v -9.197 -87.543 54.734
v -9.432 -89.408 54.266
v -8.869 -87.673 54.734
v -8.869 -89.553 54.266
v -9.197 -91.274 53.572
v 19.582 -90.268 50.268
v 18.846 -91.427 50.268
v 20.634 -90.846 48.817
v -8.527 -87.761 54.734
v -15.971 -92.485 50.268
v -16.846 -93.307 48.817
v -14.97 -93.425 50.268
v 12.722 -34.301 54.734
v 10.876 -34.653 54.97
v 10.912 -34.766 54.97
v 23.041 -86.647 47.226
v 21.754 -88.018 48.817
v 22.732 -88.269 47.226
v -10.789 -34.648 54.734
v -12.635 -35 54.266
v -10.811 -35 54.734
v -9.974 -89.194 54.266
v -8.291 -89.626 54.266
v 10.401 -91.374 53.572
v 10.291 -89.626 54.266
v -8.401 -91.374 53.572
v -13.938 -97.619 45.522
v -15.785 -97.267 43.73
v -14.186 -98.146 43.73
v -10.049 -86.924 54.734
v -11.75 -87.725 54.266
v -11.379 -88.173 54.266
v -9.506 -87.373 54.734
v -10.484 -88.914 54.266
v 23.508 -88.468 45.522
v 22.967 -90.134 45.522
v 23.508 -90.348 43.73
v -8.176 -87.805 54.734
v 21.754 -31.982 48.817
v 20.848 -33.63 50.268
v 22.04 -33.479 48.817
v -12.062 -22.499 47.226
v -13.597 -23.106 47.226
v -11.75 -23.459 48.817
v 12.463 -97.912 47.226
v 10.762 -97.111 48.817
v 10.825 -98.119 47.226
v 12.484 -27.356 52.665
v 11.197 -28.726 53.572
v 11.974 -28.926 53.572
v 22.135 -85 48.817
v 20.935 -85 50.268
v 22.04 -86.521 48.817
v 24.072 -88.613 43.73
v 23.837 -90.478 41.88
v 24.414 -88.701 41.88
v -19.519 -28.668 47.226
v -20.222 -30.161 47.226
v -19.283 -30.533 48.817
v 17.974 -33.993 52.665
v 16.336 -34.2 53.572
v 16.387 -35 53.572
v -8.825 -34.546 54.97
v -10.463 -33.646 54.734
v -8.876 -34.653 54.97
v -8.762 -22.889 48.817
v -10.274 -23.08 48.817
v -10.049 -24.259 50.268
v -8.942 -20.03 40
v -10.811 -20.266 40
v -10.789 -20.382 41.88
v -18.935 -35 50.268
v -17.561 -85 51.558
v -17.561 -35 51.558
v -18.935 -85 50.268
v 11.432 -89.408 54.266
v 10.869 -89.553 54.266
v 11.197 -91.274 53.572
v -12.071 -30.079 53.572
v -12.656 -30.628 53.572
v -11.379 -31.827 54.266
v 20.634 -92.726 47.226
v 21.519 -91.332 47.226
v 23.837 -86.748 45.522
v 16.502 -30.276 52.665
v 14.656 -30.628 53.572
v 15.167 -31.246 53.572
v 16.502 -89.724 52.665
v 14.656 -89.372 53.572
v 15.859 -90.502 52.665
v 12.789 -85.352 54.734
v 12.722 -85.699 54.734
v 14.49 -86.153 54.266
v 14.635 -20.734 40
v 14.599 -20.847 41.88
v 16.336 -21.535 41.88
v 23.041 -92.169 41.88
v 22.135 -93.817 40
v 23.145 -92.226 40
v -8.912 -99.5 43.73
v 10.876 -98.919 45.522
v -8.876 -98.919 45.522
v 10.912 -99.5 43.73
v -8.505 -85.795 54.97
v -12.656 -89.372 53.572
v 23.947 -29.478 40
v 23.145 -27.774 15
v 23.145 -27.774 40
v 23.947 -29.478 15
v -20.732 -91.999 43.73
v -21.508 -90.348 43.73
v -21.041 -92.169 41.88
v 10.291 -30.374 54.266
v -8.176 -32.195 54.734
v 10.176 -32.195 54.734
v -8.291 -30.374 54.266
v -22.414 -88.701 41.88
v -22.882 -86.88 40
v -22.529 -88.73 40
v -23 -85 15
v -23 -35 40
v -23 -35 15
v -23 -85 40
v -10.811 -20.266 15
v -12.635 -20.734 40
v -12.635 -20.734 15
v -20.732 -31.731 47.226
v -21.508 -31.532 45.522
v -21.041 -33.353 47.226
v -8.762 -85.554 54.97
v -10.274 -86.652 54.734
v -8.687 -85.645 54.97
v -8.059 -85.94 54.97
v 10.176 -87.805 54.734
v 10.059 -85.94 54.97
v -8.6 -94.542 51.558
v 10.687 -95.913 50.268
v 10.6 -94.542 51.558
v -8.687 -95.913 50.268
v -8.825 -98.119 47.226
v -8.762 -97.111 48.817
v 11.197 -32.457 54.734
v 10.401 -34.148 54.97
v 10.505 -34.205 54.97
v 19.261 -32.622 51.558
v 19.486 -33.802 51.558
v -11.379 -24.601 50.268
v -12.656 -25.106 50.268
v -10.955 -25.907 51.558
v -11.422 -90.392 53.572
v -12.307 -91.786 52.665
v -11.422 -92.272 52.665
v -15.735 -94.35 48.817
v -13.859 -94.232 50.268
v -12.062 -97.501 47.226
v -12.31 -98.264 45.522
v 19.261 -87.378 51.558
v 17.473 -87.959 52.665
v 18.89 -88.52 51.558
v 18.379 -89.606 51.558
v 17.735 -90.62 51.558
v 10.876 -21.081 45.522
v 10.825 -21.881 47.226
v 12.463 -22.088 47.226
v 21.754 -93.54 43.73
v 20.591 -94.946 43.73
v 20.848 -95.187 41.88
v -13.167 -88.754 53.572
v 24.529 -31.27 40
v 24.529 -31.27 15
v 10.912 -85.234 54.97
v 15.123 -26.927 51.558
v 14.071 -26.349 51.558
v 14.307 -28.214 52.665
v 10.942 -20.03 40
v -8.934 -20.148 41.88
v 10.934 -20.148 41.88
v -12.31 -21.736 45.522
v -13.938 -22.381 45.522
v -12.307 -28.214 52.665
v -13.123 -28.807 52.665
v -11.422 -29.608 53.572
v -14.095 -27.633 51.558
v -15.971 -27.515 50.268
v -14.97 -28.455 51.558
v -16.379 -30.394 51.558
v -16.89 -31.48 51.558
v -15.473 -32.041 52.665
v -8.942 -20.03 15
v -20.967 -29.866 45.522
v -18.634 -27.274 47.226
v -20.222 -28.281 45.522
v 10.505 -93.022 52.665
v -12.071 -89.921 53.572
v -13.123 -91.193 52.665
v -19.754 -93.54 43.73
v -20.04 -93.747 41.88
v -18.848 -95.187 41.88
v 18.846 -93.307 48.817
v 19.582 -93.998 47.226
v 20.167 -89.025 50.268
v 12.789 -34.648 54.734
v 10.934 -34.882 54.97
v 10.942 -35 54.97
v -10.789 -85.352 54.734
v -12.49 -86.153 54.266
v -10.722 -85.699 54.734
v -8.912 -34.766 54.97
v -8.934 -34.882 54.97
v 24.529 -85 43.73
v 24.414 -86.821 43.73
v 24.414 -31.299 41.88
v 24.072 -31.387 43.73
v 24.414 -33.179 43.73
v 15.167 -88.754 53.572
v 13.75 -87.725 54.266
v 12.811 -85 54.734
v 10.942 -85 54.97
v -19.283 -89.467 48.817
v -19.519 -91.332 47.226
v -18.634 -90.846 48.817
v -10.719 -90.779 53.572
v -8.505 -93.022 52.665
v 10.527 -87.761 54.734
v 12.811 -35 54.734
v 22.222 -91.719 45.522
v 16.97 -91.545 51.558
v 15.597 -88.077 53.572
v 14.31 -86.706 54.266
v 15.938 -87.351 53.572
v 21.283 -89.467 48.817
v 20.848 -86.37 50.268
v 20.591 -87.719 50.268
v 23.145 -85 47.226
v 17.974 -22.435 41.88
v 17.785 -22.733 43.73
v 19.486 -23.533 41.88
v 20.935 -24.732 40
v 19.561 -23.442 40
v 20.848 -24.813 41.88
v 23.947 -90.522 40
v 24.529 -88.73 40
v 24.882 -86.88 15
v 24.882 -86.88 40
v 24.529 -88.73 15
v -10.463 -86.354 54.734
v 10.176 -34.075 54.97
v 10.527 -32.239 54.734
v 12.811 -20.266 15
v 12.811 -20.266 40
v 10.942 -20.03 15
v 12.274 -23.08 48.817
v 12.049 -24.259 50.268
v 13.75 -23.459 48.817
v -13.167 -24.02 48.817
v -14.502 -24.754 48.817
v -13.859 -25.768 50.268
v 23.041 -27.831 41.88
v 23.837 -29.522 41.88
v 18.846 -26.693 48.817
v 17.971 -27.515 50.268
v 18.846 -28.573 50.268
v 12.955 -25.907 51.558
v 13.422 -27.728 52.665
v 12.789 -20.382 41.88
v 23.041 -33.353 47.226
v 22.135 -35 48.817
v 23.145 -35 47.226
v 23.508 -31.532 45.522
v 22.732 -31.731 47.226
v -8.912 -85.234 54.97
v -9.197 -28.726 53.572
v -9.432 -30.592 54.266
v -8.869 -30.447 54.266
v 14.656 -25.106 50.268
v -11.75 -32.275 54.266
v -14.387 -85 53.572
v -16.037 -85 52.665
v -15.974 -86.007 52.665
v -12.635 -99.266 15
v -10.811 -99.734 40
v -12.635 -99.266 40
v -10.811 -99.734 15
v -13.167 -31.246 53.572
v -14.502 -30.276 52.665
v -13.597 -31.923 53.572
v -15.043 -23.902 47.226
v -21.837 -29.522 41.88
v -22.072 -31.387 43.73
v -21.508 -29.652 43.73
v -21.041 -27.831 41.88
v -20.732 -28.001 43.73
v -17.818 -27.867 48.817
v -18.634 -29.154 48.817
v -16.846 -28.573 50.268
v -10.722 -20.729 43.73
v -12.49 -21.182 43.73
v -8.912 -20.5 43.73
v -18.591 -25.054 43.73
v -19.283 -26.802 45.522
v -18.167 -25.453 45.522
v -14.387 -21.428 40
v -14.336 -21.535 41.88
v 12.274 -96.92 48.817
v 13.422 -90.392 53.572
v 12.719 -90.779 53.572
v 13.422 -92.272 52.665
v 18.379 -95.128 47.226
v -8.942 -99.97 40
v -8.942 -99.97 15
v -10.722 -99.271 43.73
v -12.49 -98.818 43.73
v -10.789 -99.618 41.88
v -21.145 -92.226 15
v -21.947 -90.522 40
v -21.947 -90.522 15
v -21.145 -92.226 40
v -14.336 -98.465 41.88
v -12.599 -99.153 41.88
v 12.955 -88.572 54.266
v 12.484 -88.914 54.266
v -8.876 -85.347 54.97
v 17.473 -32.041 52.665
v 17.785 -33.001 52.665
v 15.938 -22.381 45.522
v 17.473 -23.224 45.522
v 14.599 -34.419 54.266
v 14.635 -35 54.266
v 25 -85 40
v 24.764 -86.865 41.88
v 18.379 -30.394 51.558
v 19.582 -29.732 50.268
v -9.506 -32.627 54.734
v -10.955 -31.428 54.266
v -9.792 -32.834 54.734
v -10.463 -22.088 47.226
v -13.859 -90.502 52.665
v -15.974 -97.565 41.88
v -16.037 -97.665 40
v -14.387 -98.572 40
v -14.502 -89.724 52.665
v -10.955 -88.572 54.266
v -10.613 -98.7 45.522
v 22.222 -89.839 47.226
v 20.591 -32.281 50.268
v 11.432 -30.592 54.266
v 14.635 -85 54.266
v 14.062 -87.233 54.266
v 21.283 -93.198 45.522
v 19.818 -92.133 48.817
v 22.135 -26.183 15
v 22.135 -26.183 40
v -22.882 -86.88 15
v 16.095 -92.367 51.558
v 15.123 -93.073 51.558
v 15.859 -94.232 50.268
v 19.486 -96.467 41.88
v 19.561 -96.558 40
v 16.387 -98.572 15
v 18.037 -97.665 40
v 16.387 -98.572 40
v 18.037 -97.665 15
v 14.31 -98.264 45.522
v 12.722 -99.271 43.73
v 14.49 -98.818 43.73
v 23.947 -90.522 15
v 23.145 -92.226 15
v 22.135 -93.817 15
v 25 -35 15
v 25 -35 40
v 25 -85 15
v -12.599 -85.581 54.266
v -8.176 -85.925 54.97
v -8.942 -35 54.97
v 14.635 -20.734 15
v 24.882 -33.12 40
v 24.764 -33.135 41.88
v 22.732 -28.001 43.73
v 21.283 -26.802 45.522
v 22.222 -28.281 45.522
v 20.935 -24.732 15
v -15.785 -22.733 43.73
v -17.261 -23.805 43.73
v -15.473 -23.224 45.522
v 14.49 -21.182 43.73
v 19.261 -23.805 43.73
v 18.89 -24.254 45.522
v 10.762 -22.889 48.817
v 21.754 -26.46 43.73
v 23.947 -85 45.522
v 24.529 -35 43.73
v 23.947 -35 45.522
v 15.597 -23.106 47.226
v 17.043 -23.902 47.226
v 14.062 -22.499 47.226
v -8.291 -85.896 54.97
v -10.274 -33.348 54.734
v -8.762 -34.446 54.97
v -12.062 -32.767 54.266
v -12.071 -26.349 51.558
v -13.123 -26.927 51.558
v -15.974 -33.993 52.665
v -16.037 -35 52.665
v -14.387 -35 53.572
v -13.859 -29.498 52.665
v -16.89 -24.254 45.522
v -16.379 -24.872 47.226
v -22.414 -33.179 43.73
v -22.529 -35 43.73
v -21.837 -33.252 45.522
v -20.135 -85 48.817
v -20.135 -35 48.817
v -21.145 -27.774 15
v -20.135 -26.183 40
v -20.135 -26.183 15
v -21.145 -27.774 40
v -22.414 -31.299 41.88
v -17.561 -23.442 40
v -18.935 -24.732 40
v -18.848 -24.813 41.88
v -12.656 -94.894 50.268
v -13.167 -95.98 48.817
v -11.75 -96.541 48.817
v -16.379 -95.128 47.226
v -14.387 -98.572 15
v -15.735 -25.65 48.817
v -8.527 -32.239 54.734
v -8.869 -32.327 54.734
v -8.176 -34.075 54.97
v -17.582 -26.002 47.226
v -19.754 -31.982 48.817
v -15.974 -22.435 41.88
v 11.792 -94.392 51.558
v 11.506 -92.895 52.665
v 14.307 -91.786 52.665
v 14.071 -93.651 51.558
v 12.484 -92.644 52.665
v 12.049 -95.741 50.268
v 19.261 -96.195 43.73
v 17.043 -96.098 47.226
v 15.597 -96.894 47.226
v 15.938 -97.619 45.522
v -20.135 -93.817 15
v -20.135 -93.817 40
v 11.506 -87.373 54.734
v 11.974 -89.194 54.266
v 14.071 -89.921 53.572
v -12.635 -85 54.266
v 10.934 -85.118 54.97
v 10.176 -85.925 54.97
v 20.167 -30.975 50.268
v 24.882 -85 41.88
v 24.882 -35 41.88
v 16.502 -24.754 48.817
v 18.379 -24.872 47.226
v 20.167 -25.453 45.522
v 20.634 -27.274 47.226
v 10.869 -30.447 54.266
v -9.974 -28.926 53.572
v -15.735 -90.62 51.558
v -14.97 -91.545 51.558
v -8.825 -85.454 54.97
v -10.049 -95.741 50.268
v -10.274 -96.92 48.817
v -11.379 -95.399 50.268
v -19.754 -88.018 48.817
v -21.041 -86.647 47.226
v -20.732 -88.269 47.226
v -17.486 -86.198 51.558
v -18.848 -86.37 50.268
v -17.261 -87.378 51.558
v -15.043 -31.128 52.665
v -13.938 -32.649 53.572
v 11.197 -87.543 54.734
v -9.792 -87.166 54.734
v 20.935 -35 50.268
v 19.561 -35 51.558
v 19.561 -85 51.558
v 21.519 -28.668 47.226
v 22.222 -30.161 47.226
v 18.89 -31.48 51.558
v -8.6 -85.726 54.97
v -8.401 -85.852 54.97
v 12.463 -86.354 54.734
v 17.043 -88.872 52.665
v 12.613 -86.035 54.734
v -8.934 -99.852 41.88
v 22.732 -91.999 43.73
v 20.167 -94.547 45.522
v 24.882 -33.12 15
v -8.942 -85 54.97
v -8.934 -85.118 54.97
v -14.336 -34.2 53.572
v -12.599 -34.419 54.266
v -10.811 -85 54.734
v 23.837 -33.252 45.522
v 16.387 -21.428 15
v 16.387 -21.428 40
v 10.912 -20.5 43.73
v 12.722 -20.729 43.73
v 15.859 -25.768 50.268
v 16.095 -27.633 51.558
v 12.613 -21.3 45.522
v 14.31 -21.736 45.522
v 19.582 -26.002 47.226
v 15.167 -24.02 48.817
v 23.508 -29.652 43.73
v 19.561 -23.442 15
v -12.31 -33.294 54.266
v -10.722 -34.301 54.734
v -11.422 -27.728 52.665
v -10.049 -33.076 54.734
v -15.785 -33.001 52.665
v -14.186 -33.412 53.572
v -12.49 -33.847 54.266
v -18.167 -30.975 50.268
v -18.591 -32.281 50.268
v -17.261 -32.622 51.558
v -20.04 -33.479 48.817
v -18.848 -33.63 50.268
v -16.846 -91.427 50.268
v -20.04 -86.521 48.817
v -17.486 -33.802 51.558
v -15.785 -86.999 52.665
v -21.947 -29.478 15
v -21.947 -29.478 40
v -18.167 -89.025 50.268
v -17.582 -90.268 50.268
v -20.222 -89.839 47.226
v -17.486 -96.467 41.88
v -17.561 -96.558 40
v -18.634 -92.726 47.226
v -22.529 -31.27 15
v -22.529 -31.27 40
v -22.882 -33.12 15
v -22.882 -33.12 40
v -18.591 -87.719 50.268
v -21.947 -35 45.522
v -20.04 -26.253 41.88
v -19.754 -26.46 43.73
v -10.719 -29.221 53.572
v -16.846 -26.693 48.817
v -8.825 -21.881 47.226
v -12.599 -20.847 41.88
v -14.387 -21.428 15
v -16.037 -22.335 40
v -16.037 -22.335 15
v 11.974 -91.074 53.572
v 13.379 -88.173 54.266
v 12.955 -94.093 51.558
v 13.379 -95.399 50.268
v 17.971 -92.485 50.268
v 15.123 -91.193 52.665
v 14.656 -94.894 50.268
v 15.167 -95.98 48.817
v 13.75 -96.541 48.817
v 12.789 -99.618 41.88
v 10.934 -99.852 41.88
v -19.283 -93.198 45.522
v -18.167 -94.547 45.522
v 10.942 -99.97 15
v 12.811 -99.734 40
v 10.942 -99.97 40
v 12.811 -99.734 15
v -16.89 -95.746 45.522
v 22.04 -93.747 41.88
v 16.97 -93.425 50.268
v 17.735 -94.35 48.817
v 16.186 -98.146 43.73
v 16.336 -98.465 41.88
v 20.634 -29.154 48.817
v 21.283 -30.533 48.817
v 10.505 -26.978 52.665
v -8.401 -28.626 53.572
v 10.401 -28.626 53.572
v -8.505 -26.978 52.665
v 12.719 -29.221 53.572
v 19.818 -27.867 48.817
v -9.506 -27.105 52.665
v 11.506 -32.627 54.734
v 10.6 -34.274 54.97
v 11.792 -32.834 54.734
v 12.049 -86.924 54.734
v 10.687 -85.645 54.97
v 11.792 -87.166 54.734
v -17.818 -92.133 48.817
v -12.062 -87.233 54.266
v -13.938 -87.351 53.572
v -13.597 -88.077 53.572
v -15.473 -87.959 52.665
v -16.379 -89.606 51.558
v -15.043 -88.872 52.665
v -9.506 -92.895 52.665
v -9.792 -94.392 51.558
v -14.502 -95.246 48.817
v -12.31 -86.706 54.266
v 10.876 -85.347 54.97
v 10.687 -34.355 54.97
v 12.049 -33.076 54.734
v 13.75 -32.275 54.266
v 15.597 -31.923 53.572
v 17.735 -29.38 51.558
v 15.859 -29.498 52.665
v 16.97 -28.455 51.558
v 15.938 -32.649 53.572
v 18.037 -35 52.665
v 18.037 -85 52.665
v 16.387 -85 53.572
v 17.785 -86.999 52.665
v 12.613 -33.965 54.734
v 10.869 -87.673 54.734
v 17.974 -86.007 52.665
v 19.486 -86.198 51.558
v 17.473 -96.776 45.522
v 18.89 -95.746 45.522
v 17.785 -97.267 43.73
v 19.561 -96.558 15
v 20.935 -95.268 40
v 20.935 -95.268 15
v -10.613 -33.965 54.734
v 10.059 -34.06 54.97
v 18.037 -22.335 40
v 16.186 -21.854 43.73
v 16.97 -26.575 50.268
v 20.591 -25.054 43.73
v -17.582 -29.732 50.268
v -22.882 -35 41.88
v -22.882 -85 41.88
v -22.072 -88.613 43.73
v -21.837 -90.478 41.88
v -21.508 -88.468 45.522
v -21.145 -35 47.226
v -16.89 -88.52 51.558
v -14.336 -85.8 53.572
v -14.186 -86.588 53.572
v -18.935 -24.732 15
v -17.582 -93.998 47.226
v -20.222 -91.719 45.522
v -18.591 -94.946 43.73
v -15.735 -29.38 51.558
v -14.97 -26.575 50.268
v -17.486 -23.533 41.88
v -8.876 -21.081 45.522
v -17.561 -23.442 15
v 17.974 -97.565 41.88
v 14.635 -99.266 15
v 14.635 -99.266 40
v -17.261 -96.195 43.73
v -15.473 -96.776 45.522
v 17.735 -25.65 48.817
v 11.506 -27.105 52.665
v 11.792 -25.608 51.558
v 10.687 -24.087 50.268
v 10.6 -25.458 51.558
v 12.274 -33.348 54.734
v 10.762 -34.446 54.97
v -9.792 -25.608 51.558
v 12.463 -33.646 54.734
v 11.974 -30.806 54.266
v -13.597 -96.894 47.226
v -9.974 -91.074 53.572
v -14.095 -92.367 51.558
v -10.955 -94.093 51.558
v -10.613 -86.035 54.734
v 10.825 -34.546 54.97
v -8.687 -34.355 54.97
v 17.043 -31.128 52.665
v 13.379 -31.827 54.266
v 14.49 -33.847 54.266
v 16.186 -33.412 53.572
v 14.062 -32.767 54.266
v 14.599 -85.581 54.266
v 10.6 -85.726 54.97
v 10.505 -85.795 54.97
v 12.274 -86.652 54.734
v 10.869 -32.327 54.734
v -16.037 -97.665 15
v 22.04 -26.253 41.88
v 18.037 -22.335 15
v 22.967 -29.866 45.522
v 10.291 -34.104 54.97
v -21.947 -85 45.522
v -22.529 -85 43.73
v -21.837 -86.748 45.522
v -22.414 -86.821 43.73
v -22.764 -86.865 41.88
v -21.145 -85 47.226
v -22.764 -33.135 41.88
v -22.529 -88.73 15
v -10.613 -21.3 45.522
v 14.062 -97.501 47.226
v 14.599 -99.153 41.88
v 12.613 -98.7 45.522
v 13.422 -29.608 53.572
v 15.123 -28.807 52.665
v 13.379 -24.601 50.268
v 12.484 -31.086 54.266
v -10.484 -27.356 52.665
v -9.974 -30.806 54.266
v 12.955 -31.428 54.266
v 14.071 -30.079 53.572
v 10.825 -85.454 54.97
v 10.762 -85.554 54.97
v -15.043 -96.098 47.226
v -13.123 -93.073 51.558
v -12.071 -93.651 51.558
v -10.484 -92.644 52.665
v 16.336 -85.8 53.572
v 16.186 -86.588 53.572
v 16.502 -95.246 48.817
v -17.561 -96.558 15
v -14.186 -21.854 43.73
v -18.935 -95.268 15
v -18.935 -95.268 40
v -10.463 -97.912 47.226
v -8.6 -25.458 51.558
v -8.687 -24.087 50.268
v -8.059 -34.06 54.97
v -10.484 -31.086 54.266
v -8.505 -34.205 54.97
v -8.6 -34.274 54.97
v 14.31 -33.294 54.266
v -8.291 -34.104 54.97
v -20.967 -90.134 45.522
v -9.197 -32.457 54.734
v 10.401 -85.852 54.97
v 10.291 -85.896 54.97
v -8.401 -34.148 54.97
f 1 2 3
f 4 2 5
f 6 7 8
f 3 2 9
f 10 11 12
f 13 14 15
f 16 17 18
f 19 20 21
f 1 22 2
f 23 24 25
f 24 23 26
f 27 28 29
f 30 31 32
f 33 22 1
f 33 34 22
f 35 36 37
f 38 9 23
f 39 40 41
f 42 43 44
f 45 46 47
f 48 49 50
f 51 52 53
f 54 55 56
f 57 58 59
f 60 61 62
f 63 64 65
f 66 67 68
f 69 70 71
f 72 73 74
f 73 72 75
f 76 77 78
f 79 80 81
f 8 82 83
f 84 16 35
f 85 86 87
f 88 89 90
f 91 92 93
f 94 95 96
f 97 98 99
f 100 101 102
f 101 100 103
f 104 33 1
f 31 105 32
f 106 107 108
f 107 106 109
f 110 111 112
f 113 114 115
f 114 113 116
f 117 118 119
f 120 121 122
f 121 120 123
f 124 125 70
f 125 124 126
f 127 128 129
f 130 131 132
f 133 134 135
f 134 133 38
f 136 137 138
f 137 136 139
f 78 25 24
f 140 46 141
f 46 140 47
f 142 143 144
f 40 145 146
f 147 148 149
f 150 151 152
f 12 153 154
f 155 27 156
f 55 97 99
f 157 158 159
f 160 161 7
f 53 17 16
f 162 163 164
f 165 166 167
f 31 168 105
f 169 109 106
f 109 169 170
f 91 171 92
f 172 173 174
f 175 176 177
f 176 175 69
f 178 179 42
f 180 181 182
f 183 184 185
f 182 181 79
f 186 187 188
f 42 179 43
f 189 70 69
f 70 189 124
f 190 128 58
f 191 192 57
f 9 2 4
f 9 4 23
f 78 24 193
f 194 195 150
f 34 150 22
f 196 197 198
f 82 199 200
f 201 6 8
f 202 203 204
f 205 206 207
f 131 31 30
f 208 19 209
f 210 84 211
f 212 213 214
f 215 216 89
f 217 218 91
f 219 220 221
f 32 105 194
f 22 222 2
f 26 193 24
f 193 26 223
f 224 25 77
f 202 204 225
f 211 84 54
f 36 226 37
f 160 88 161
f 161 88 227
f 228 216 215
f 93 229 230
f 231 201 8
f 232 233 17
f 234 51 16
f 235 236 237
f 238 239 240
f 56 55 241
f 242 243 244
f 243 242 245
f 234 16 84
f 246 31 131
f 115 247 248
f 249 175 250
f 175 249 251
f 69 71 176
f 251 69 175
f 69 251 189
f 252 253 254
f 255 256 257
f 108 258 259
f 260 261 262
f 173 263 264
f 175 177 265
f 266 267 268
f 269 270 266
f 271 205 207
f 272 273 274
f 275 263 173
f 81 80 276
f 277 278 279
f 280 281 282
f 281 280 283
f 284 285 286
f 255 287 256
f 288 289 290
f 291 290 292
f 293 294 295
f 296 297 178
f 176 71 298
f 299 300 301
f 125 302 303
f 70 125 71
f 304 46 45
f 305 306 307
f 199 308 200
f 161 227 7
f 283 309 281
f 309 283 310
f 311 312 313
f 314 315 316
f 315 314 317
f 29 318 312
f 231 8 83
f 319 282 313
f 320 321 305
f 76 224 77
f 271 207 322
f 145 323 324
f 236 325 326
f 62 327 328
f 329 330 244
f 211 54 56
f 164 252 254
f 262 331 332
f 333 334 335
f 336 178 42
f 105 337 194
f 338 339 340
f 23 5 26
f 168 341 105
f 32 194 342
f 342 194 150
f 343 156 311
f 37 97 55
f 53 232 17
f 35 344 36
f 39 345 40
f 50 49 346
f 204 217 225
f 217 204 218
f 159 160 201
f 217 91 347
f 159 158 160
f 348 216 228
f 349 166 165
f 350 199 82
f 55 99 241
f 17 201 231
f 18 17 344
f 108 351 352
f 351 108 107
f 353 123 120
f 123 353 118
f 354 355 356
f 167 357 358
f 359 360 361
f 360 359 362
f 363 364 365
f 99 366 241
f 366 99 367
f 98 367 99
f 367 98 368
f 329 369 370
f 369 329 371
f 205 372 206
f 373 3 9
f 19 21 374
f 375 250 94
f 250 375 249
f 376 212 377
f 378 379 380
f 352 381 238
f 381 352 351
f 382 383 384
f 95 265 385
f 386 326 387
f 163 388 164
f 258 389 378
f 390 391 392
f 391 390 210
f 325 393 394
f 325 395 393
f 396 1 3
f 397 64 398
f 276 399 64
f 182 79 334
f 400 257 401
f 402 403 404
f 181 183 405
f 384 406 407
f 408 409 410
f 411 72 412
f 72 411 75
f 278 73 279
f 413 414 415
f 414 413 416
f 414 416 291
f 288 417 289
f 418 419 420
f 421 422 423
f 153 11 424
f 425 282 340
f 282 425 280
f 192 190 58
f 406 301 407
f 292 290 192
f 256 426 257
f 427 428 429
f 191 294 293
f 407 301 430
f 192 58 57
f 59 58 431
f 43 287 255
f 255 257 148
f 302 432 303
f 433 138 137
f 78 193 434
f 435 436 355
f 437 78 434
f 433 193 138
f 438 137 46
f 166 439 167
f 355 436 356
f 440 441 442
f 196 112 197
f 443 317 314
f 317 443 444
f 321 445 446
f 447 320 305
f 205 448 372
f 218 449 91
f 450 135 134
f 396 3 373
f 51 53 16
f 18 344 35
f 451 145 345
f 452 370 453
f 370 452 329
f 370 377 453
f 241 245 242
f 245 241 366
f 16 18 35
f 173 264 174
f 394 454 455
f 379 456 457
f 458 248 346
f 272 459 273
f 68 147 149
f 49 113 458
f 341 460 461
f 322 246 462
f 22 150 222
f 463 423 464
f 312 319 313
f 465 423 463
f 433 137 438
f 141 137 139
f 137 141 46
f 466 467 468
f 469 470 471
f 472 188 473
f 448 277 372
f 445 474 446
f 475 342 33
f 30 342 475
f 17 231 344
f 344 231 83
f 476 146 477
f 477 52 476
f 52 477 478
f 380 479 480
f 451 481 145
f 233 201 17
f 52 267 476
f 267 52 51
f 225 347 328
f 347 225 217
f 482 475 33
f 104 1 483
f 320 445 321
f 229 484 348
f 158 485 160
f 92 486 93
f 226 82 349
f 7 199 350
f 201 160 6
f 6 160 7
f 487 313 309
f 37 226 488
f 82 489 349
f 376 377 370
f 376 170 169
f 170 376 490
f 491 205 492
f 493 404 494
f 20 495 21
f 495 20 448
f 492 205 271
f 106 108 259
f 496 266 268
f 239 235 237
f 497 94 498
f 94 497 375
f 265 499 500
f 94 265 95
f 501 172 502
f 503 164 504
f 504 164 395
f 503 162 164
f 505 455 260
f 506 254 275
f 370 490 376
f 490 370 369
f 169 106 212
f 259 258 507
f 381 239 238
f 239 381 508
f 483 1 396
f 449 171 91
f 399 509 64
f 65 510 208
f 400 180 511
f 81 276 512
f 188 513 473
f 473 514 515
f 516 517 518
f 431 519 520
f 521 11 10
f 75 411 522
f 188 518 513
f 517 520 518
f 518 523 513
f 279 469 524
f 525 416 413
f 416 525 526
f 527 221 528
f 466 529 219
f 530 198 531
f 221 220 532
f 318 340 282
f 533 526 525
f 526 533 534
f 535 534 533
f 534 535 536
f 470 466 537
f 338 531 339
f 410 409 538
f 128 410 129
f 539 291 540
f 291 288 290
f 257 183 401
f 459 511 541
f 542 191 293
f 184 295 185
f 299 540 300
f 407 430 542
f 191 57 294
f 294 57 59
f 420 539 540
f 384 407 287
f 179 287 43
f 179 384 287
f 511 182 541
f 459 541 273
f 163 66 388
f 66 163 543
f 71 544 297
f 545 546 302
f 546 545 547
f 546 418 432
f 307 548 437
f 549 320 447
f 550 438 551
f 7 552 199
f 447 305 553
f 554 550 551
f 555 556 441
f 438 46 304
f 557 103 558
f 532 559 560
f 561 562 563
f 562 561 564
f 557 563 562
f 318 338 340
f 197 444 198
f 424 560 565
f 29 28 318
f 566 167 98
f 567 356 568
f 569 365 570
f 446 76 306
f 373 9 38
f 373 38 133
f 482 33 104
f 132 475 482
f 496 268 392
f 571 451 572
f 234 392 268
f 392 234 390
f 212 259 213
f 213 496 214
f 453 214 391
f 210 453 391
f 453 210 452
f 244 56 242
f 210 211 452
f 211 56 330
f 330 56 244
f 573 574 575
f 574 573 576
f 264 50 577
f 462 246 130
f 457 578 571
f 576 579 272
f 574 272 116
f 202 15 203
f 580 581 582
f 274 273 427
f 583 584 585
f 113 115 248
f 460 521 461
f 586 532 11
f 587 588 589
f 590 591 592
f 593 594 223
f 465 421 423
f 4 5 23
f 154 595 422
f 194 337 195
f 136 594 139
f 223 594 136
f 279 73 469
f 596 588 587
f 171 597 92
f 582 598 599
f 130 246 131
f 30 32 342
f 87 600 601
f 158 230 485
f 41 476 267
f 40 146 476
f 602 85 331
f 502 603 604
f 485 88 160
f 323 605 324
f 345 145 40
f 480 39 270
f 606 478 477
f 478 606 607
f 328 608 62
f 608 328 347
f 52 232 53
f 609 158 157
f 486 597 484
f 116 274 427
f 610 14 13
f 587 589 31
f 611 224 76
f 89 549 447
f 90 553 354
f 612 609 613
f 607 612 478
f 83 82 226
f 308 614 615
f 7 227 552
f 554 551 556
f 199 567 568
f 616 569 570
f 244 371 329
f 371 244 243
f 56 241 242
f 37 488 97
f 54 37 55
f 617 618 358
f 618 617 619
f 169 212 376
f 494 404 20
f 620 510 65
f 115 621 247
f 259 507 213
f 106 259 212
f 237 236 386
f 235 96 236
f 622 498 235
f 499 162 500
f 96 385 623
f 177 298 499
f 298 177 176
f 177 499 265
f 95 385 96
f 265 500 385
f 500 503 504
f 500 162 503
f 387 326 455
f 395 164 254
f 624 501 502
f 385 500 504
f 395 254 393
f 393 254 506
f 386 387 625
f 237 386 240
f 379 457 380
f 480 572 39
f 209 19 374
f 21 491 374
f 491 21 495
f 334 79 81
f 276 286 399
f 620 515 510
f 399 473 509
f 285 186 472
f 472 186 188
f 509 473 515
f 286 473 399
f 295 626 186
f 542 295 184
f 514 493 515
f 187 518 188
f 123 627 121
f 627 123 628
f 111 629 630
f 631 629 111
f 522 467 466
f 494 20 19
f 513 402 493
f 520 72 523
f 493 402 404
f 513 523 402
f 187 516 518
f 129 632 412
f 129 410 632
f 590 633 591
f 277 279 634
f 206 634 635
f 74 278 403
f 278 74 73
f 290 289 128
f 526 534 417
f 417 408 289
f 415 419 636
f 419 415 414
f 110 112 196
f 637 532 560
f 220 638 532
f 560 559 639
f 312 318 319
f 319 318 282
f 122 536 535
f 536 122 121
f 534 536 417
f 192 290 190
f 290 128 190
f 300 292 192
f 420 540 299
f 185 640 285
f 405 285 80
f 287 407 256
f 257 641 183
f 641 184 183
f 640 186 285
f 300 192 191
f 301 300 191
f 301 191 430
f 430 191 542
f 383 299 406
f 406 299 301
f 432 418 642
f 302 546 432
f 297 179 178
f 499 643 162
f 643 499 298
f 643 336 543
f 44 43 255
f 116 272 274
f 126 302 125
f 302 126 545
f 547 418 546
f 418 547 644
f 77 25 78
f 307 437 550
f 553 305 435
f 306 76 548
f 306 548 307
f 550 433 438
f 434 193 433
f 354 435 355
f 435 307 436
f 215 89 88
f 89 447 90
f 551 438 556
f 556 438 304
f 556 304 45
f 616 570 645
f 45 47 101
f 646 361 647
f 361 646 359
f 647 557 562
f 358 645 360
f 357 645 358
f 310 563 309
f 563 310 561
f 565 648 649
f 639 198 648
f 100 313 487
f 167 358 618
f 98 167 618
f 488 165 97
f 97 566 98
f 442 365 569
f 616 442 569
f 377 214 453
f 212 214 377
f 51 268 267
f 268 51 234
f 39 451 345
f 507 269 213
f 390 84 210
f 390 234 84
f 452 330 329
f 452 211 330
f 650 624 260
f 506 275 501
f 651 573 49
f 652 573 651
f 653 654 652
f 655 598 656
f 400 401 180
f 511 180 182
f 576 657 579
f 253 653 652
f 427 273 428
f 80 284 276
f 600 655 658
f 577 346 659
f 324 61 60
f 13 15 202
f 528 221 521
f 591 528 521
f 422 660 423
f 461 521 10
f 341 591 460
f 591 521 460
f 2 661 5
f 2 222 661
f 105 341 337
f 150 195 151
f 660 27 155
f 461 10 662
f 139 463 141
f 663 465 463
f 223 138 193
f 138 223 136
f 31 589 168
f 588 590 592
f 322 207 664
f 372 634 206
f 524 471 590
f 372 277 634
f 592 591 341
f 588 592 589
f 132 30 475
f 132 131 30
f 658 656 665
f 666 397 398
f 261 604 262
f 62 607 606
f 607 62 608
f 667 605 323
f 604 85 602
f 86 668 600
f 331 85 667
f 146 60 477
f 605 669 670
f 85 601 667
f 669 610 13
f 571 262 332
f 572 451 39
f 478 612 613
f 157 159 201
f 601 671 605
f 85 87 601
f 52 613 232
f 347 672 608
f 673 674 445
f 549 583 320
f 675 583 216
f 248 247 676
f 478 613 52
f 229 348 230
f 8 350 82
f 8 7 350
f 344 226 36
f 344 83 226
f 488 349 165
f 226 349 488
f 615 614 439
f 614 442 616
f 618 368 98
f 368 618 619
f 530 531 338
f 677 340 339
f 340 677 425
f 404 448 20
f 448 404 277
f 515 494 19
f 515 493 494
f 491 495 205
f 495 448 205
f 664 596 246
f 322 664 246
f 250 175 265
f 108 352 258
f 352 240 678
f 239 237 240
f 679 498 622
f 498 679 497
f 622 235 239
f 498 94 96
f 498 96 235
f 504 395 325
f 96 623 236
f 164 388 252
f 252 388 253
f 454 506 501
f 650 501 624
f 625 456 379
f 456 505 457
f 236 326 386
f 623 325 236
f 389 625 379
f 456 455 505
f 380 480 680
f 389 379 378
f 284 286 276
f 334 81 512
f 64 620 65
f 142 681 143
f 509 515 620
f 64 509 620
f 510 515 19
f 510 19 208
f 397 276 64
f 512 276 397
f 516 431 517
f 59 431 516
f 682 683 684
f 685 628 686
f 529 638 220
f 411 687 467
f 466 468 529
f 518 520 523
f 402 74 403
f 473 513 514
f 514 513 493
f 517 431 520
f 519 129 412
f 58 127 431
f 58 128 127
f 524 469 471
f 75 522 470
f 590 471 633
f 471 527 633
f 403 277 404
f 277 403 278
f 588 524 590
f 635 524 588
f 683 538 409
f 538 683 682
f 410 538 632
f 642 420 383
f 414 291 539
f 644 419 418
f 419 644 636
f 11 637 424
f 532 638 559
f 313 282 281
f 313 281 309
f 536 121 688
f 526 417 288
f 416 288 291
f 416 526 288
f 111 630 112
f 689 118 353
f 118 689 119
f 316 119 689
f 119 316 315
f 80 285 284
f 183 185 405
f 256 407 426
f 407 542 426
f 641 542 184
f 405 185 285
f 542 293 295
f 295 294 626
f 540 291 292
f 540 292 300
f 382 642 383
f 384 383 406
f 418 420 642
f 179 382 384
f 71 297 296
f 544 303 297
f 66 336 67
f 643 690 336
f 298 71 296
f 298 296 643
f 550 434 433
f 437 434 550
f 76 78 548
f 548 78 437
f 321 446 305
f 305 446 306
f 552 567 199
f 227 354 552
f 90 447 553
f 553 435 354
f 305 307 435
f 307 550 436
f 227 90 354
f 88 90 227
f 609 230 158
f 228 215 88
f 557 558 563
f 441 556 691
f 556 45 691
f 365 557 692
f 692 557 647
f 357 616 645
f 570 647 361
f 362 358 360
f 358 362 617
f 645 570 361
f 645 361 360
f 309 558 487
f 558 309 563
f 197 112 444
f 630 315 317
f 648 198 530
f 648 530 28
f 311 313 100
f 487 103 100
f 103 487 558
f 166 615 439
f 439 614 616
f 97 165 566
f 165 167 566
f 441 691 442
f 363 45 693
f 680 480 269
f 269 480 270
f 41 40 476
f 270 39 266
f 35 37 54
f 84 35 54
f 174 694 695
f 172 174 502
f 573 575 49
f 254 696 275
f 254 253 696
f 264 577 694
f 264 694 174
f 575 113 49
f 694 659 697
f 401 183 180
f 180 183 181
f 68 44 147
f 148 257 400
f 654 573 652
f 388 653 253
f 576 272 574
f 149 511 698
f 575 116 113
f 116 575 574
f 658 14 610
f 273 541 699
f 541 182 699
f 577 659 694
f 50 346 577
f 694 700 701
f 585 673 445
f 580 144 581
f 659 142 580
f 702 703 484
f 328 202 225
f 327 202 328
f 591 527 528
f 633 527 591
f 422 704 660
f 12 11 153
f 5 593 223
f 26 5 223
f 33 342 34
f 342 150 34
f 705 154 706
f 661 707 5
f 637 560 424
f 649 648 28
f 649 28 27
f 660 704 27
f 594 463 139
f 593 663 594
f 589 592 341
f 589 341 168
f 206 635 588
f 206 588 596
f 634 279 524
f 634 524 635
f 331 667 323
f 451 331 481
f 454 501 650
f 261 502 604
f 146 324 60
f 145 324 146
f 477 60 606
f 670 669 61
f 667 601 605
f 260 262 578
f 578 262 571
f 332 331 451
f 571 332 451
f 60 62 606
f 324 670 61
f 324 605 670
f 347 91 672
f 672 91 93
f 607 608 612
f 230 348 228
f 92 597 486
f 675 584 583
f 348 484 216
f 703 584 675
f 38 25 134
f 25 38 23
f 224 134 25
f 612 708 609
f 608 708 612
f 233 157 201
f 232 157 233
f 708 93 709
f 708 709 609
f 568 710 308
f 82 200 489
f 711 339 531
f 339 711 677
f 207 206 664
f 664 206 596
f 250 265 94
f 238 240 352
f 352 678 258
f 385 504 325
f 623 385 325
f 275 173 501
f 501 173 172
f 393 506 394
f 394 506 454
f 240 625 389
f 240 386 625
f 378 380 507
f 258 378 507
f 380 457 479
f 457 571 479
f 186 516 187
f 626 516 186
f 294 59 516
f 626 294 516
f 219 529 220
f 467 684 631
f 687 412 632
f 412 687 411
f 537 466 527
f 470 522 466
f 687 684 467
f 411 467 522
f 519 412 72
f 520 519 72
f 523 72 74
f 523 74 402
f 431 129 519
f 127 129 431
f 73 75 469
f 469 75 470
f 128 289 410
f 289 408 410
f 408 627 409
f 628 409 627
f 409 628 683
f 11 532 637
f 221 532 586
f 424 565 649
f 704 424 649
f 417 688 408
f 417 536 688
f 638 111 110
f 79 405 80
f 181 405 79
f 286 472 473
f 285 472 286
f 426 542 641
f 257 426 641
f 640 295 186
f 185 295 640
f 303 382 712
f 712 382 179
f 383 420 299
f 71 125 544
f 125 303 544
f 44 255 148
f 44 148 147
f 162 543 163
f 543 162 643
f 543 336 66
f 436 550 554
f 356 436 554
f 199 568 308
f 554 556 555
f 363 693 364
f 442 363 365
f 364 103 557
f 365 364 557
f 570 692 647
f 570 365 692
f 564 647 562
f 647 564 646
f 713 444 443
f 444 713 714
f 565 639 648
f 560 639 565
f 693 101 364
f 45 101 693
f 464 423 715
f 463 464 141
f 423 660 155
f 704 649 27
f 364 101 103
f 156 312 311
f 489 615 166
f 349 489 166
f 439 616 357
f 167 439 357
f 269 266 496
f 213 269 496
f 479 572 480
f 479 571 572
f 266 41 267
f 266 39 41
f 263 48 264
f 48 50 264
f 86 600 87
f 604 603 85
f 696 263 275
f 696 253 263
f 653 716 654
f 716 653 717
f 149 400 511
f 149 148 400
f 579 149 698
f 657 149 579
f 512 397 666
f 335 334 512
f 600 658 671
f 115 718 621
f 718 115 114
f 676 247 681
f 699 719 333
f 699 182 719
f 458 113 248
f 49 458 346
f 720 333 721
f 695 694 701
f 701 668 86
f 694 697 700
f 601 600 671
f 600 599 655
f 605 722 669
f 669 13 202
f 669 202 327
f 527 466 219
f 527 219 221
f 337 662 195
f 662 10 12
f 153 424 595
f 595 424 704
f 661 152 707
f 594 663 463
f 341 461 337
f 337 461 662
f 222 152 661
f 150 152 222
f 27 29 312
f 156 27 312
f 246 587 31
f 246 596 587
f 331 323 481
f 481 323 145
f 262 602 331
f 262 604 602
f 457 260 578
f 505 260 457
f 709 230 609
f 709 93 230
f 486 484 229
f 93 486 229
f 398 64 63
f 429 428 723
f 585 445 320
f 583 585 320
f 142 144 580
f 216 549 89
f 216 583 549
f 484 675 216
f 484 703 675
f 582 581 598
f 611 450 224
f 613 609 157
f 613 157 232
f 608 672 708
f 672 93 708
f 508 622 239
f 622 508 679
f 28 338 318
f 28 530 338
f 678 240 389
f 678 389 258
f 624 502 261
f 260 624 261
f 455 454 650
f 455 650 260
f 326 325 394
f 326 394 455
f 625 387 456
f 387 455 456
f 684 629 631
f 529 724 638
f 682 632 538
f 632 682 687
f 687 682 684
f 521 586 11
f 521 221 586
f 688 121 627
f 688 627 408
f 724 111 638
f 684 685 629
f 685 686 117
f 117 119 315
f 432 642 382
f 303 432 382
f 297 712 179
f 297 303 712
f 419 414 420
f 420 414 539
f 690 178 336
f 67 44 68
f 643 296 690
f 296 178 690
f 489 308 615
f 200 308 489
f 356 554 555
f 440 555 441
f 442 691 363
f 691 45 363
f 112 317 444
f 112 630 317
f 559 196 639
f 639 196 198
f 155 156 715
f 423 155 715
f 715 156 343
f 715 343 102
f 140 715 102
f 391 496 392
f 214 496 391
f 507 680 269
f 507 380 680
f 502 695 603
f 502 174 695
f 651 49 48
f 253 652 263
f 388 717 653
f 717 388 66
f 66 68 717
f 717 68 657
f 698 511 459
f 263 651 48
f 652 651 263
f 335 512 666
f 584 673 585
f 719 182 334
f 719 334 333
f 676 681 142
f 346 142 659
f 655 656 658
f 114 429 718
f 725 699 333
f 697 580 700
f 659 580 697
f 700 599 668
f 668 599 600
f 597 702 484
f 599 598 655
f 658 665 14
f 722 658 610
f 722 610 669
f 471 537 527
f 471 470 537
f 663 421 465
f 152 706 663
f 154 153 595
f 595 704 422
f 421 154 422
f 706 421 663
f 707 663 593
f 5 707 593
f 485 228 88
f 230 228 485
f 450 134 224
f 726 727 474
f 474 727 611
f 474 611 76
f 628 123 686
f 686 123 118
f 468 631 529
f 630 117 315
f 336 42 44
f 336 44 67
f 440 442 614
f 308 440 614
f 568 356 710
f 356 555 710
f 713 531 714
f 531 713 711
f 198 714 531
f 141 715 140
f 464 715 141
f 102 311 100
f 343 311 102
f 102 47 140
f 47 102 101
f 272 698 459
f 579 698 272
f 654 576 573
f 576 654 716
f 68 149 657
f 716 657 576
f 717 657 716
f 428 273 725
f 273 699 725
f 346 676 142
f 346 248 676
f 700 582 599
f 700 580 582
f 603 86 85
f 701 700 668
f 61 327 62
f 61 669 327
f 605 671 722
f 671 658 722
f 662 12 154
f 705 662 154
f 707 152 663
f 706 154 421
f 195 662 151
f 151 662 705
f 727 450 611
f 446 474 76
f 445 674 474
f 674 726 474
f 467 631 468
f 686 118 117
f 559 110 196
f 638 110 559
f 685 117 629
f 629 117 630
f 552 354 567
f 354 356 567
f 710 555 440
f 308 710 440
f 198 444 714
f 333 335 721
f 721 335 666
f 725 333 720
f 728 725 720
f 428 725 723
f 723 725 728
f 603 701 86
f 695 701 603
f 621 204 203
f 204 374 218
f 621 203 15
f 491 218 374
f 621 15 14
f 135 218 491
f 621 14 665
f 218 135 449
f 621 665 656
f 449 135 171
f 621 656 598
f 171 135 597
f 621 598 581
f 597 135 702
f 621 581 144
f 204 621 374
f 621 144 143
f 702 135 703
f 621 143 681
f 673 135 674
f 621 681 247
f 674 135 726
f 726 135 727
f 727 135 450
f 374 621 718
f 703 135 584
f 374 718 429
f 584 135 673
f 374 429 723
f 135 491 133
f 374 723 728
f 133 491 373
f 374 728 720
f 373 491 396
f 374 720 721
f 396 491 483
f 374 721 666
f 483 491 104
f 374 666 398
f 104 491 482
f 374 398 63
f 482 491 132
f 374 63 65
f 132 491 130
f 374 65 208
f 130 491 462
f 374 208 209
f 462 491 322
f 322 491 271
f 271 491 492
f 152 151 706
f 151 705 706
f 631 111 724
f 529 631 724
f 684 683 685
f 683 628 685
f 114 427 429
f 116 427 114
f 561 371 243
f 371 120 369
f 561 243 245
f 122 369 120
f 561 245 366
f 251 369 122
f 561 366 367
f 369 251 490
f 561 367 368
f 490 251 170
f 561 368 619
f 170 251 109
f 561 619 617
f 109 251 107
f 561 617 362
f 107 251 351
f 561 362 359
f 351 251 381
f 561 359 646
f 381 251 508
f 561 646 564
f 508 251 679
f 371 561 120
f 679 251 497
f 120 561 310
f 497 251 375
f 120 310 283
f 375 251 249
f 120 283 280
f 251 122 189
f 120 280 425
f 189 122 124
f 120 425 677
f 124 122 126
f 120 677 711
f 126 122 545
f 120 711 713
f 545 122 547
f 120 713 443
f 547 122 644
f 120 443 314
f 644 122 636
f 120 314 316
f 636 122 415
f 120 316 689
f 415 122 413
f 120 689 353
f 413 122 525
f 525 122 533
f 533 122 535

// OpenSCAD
r = 15; //-- Radio de las curvas
vertice = [
  [-8, -35, 0],
  [-8, -35, 40],
  [-8, -85, 40],
  [-8, -85, 0],
  [10, -35, 0],
  [10, -35, 40],
  [10, -85, 0],
  [10, -85, 40],
]; 
baseSupport();
module baseSupport(){
    difference(){
        hull(){
          for (pos = vertice)
            translate(pos)
              sphere(r = r, $fn = 50);
        }
        translate([-30,-110,-20])
            cube(size = [70,90,35], center = true/false, $fn=6);
    } 
}
